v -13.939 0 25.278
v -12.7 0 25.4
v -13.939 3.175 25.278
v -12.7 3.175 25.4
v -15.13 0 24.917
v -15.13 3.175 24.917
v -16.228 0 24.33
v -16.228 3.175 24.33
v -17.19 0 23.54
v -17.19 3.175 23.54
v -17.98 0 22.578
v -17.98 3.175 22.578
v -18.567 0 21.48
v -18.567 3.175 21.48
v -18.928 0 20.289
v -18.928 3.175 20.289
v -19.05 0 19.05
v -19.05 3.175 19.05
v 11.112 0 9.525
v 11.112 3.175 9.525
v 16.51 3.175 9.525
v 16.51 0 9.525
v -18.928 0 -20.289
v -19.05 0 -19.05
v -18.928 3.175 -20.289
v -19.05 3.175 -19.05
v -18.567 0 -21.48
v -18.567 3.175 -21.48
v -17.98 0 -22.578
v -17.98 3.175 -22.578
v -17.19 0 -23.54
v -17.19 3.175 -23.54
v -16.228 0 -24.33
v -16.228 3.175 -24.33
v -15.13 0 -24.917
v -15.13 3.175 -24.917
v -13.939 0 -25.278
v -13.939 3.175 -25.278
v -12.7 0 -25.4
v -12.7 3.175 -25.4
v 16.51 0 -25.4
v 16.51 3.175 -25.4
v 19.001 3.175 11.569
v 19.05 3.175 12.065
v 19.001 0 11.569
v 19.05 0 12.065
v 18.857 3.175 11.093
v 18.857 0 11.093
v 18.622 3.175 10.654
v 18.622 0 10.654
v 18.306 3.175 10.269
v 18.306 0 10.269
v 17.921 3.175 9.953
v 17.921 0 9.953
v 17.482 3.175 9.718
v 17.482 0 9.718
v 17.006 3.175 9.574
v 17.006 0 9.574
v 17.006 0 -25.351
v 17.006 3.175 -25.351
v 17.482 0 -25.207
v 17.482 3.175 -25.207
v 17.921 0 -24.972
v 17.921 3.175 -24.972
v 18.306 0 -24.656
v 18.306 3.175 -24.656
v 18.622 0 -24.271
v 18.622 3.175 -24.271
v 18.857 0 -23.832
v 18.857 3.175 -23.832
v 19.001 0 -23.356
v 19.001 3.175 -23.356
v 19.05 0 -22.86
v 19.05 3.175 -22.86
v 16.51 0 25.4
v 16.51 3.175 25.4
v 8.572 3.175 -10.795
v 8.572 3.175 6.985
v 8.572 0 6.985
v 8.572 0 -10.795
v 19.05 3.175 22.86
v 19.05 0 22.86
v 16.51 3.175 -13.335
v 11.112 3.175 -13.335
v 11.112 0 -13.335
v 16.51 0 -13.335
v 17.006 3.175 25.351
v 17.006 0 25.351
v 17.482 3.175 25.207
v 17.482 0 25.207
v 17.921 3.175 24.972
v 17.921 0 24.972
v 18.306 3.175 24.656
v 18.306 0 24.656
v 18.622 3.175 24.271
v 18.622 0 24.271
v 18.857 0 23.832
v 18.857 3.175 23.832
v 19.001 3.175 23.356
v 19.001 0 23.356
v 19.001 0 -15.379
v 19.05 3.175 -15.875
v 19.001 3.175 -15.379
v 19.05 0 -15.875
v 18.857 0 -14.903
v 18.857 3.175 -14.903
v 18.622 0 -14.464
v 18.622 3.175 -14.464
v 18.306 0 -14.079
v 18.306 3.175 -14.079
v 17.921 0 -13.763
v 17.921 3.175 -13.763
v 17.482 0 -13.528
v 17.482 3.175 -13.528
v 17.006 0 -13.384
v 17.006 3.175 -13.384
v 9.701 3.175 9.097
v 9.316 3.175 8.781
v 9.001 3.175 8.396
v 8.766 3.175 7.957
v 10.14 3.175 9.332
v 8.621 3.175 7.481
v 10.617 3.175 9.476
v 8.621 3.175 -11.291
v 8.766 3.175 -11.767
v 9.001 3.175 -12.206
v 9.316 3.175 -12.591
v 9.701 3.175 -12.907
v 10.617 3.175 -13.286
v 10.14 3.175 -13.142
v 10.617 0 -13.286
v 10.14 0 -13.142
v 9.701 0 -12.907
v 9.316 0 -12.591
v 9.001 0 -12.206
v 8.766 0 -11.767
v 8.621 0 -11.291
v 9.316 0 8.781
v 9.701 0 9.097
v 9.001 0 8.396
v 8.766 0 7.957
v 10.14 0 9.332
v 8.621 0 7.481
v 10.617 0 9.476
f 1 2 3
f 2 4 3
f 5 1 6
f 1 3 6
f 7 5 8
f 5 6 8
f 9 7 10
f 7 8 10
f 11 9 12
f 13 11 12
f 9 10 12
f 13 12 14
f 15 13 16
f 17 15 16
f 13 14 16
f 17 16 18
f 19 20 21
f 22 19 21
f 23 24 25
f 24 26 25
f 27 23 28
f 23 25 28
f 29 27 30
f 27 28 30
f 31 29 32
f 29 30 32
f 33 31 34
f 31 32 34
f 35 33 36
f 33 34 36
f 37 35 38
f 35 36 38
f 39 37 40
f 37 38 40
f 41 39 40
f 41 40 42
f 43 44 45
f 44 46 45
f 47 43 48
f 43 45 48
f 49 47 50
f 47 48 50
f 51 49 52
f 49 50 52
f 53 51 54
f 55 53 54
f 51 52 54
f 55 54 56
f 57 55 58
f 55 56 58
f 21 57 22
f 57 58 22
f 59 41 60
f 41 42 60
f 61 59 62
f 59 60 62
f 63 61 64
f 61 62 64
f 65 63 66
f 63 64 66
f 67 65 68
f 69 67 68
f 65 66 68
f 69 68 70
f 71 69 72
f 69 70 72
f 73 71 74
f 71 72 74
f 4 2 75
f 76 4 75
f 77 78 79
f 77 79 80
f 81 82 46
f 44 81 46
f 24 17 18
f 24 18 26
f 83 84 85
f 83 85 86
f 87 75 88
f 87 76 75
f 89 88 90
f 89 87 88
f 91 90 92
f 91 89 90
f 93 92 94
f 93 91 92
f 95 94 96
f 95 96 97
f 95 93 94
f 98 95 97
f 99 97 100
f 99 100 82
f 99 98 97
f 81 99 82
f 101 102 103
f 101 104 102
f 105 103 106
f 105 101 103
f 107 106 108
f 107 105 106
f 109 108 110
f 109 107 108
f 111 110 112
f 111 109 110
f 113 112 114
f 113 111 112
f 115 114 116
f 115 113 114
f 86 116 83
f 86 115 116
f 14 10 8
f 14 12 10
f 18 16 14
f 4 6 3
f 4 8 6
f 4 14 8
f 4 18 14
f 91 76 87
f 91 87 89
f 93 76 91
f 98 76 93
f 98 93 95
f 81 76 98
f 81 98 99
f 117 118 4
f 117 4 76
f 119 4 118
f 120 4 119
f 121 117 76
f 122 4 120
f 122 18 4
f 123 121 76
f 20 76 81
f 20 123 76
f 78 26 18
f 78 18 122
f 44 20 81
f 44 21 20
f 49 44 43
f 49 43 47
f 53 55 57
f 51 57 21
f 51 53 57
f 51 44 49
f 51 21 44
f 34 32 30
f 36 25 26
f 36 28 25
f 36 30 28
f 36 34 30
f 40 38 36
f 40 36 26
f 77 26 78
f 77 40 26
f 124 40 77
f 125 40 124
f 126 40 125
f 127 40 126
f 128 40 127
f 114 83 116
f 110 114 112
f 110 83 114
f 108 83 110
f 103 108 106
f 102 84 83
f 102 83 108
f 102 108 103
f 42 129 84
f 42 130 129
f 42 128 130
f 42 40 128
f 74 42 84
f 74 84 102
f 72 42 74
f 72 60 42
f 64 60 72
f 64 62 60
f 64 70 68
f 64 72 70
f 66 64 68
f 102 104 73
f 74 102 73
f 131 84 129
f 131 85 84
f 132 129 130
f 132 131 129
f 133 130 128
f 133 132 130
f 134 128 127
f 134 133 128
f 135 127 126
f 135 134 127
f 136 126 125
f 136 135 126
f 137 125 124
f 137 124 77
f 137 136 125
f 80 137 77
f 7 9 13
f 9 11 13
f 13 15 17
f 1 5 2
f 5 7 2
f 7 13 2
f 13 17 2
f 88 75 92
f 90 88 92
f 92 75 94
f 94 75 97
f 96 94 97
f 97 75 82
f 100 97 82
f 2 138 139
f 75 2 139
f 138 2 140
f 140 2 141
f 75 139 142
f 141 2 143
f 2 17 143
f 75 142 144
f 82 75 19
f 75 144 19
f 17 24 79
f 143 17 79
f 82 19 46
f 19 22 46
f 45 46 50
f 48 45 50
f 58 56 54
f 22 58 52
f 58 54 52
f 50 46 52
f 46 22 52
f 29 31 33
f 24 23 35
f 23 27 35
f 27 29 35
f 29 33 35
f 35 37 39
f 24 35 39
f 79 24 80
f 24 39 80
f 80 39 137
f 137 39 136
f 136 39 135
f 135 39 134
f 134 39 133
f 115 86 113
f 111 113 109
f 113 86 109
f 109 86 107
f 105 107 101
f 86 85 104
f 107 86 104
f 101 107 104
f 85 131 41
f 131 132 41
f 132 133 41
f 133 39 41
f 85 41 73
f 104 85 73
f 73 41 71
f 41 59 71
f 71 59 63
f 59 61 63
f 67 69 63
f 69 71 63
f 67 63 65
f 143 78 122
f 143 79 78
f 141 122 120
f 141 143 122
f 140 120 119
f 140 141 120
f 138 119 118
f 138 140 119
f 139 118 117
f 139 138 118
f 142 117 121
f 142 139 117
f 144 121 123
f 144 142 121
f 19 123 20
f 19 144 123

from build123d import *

# Parameters (mm, degrees)
SKETCH1_W           = 38.1
SKETCH1_H           = 50.8
BOSS_EXTRUDE1_DEPTH = 3.175
SKETCH2_W           = 10.4775
SKETCH2_H           = 22.86
CUT_EXTRUDE2_DEPTH  = 32.908355097
FILLET1_R           = 2.54
FILLET2_R           = 6.35


with BuildPart() as part:
    # Sketch1 → Boss-Extrude1 (new body)
    with BuildSketch(Plane(origin=(0, 0, 0), x_dir=(1, 0, 0), z_dir=(0, 1, 0))):
        Rectangle(SKETCH1_W, SKETCH1_H)
    extrude(amount=BOSS_EXTRUDE1_DEPTH)

    # Sketch2 → Cut-Extrude2 (cut, through all)
    with BuildSketch(Plane(origin=(0, 3.175, 0), x_dir=(1, 0, 0), z_dir=(0, 1, 0))):
        with Locations((13.81125, 1.905)):
            Rectangle(SKETCH2_W, SKETCH2_H)
    extrude(amount=-CUT_EXTRUDE2_DEPTH, mode=Mode.SUBTRACT)

    # Fillet1
    fillet1_edges = [part.edges().sort_by_distance(p)[0] for p in [
        (19.05, 1.5875, -13.335),
        (19.05, 1.5875, 9.525),
        (8.5725, 1.5875, 9.525),
        (8.5725, 1.5875, -13.335),
        (19.05, 1.5875, 25.4),
        (19.05, 1.5875, -25.4),
    ]]
    fillet(fillet1_edges, radius=FILLET1_R)

    # Fillet2
    fillet2_edges = [part.edges().sort_by_distance(p)[0] for p in [
        (-19.05, 1.5875, 25.4),
        (-19.05, 1.5875, -25.4),
    ]]
    fillet(fillet2_edges, radius=FILLET2_R)


solid = part.part
